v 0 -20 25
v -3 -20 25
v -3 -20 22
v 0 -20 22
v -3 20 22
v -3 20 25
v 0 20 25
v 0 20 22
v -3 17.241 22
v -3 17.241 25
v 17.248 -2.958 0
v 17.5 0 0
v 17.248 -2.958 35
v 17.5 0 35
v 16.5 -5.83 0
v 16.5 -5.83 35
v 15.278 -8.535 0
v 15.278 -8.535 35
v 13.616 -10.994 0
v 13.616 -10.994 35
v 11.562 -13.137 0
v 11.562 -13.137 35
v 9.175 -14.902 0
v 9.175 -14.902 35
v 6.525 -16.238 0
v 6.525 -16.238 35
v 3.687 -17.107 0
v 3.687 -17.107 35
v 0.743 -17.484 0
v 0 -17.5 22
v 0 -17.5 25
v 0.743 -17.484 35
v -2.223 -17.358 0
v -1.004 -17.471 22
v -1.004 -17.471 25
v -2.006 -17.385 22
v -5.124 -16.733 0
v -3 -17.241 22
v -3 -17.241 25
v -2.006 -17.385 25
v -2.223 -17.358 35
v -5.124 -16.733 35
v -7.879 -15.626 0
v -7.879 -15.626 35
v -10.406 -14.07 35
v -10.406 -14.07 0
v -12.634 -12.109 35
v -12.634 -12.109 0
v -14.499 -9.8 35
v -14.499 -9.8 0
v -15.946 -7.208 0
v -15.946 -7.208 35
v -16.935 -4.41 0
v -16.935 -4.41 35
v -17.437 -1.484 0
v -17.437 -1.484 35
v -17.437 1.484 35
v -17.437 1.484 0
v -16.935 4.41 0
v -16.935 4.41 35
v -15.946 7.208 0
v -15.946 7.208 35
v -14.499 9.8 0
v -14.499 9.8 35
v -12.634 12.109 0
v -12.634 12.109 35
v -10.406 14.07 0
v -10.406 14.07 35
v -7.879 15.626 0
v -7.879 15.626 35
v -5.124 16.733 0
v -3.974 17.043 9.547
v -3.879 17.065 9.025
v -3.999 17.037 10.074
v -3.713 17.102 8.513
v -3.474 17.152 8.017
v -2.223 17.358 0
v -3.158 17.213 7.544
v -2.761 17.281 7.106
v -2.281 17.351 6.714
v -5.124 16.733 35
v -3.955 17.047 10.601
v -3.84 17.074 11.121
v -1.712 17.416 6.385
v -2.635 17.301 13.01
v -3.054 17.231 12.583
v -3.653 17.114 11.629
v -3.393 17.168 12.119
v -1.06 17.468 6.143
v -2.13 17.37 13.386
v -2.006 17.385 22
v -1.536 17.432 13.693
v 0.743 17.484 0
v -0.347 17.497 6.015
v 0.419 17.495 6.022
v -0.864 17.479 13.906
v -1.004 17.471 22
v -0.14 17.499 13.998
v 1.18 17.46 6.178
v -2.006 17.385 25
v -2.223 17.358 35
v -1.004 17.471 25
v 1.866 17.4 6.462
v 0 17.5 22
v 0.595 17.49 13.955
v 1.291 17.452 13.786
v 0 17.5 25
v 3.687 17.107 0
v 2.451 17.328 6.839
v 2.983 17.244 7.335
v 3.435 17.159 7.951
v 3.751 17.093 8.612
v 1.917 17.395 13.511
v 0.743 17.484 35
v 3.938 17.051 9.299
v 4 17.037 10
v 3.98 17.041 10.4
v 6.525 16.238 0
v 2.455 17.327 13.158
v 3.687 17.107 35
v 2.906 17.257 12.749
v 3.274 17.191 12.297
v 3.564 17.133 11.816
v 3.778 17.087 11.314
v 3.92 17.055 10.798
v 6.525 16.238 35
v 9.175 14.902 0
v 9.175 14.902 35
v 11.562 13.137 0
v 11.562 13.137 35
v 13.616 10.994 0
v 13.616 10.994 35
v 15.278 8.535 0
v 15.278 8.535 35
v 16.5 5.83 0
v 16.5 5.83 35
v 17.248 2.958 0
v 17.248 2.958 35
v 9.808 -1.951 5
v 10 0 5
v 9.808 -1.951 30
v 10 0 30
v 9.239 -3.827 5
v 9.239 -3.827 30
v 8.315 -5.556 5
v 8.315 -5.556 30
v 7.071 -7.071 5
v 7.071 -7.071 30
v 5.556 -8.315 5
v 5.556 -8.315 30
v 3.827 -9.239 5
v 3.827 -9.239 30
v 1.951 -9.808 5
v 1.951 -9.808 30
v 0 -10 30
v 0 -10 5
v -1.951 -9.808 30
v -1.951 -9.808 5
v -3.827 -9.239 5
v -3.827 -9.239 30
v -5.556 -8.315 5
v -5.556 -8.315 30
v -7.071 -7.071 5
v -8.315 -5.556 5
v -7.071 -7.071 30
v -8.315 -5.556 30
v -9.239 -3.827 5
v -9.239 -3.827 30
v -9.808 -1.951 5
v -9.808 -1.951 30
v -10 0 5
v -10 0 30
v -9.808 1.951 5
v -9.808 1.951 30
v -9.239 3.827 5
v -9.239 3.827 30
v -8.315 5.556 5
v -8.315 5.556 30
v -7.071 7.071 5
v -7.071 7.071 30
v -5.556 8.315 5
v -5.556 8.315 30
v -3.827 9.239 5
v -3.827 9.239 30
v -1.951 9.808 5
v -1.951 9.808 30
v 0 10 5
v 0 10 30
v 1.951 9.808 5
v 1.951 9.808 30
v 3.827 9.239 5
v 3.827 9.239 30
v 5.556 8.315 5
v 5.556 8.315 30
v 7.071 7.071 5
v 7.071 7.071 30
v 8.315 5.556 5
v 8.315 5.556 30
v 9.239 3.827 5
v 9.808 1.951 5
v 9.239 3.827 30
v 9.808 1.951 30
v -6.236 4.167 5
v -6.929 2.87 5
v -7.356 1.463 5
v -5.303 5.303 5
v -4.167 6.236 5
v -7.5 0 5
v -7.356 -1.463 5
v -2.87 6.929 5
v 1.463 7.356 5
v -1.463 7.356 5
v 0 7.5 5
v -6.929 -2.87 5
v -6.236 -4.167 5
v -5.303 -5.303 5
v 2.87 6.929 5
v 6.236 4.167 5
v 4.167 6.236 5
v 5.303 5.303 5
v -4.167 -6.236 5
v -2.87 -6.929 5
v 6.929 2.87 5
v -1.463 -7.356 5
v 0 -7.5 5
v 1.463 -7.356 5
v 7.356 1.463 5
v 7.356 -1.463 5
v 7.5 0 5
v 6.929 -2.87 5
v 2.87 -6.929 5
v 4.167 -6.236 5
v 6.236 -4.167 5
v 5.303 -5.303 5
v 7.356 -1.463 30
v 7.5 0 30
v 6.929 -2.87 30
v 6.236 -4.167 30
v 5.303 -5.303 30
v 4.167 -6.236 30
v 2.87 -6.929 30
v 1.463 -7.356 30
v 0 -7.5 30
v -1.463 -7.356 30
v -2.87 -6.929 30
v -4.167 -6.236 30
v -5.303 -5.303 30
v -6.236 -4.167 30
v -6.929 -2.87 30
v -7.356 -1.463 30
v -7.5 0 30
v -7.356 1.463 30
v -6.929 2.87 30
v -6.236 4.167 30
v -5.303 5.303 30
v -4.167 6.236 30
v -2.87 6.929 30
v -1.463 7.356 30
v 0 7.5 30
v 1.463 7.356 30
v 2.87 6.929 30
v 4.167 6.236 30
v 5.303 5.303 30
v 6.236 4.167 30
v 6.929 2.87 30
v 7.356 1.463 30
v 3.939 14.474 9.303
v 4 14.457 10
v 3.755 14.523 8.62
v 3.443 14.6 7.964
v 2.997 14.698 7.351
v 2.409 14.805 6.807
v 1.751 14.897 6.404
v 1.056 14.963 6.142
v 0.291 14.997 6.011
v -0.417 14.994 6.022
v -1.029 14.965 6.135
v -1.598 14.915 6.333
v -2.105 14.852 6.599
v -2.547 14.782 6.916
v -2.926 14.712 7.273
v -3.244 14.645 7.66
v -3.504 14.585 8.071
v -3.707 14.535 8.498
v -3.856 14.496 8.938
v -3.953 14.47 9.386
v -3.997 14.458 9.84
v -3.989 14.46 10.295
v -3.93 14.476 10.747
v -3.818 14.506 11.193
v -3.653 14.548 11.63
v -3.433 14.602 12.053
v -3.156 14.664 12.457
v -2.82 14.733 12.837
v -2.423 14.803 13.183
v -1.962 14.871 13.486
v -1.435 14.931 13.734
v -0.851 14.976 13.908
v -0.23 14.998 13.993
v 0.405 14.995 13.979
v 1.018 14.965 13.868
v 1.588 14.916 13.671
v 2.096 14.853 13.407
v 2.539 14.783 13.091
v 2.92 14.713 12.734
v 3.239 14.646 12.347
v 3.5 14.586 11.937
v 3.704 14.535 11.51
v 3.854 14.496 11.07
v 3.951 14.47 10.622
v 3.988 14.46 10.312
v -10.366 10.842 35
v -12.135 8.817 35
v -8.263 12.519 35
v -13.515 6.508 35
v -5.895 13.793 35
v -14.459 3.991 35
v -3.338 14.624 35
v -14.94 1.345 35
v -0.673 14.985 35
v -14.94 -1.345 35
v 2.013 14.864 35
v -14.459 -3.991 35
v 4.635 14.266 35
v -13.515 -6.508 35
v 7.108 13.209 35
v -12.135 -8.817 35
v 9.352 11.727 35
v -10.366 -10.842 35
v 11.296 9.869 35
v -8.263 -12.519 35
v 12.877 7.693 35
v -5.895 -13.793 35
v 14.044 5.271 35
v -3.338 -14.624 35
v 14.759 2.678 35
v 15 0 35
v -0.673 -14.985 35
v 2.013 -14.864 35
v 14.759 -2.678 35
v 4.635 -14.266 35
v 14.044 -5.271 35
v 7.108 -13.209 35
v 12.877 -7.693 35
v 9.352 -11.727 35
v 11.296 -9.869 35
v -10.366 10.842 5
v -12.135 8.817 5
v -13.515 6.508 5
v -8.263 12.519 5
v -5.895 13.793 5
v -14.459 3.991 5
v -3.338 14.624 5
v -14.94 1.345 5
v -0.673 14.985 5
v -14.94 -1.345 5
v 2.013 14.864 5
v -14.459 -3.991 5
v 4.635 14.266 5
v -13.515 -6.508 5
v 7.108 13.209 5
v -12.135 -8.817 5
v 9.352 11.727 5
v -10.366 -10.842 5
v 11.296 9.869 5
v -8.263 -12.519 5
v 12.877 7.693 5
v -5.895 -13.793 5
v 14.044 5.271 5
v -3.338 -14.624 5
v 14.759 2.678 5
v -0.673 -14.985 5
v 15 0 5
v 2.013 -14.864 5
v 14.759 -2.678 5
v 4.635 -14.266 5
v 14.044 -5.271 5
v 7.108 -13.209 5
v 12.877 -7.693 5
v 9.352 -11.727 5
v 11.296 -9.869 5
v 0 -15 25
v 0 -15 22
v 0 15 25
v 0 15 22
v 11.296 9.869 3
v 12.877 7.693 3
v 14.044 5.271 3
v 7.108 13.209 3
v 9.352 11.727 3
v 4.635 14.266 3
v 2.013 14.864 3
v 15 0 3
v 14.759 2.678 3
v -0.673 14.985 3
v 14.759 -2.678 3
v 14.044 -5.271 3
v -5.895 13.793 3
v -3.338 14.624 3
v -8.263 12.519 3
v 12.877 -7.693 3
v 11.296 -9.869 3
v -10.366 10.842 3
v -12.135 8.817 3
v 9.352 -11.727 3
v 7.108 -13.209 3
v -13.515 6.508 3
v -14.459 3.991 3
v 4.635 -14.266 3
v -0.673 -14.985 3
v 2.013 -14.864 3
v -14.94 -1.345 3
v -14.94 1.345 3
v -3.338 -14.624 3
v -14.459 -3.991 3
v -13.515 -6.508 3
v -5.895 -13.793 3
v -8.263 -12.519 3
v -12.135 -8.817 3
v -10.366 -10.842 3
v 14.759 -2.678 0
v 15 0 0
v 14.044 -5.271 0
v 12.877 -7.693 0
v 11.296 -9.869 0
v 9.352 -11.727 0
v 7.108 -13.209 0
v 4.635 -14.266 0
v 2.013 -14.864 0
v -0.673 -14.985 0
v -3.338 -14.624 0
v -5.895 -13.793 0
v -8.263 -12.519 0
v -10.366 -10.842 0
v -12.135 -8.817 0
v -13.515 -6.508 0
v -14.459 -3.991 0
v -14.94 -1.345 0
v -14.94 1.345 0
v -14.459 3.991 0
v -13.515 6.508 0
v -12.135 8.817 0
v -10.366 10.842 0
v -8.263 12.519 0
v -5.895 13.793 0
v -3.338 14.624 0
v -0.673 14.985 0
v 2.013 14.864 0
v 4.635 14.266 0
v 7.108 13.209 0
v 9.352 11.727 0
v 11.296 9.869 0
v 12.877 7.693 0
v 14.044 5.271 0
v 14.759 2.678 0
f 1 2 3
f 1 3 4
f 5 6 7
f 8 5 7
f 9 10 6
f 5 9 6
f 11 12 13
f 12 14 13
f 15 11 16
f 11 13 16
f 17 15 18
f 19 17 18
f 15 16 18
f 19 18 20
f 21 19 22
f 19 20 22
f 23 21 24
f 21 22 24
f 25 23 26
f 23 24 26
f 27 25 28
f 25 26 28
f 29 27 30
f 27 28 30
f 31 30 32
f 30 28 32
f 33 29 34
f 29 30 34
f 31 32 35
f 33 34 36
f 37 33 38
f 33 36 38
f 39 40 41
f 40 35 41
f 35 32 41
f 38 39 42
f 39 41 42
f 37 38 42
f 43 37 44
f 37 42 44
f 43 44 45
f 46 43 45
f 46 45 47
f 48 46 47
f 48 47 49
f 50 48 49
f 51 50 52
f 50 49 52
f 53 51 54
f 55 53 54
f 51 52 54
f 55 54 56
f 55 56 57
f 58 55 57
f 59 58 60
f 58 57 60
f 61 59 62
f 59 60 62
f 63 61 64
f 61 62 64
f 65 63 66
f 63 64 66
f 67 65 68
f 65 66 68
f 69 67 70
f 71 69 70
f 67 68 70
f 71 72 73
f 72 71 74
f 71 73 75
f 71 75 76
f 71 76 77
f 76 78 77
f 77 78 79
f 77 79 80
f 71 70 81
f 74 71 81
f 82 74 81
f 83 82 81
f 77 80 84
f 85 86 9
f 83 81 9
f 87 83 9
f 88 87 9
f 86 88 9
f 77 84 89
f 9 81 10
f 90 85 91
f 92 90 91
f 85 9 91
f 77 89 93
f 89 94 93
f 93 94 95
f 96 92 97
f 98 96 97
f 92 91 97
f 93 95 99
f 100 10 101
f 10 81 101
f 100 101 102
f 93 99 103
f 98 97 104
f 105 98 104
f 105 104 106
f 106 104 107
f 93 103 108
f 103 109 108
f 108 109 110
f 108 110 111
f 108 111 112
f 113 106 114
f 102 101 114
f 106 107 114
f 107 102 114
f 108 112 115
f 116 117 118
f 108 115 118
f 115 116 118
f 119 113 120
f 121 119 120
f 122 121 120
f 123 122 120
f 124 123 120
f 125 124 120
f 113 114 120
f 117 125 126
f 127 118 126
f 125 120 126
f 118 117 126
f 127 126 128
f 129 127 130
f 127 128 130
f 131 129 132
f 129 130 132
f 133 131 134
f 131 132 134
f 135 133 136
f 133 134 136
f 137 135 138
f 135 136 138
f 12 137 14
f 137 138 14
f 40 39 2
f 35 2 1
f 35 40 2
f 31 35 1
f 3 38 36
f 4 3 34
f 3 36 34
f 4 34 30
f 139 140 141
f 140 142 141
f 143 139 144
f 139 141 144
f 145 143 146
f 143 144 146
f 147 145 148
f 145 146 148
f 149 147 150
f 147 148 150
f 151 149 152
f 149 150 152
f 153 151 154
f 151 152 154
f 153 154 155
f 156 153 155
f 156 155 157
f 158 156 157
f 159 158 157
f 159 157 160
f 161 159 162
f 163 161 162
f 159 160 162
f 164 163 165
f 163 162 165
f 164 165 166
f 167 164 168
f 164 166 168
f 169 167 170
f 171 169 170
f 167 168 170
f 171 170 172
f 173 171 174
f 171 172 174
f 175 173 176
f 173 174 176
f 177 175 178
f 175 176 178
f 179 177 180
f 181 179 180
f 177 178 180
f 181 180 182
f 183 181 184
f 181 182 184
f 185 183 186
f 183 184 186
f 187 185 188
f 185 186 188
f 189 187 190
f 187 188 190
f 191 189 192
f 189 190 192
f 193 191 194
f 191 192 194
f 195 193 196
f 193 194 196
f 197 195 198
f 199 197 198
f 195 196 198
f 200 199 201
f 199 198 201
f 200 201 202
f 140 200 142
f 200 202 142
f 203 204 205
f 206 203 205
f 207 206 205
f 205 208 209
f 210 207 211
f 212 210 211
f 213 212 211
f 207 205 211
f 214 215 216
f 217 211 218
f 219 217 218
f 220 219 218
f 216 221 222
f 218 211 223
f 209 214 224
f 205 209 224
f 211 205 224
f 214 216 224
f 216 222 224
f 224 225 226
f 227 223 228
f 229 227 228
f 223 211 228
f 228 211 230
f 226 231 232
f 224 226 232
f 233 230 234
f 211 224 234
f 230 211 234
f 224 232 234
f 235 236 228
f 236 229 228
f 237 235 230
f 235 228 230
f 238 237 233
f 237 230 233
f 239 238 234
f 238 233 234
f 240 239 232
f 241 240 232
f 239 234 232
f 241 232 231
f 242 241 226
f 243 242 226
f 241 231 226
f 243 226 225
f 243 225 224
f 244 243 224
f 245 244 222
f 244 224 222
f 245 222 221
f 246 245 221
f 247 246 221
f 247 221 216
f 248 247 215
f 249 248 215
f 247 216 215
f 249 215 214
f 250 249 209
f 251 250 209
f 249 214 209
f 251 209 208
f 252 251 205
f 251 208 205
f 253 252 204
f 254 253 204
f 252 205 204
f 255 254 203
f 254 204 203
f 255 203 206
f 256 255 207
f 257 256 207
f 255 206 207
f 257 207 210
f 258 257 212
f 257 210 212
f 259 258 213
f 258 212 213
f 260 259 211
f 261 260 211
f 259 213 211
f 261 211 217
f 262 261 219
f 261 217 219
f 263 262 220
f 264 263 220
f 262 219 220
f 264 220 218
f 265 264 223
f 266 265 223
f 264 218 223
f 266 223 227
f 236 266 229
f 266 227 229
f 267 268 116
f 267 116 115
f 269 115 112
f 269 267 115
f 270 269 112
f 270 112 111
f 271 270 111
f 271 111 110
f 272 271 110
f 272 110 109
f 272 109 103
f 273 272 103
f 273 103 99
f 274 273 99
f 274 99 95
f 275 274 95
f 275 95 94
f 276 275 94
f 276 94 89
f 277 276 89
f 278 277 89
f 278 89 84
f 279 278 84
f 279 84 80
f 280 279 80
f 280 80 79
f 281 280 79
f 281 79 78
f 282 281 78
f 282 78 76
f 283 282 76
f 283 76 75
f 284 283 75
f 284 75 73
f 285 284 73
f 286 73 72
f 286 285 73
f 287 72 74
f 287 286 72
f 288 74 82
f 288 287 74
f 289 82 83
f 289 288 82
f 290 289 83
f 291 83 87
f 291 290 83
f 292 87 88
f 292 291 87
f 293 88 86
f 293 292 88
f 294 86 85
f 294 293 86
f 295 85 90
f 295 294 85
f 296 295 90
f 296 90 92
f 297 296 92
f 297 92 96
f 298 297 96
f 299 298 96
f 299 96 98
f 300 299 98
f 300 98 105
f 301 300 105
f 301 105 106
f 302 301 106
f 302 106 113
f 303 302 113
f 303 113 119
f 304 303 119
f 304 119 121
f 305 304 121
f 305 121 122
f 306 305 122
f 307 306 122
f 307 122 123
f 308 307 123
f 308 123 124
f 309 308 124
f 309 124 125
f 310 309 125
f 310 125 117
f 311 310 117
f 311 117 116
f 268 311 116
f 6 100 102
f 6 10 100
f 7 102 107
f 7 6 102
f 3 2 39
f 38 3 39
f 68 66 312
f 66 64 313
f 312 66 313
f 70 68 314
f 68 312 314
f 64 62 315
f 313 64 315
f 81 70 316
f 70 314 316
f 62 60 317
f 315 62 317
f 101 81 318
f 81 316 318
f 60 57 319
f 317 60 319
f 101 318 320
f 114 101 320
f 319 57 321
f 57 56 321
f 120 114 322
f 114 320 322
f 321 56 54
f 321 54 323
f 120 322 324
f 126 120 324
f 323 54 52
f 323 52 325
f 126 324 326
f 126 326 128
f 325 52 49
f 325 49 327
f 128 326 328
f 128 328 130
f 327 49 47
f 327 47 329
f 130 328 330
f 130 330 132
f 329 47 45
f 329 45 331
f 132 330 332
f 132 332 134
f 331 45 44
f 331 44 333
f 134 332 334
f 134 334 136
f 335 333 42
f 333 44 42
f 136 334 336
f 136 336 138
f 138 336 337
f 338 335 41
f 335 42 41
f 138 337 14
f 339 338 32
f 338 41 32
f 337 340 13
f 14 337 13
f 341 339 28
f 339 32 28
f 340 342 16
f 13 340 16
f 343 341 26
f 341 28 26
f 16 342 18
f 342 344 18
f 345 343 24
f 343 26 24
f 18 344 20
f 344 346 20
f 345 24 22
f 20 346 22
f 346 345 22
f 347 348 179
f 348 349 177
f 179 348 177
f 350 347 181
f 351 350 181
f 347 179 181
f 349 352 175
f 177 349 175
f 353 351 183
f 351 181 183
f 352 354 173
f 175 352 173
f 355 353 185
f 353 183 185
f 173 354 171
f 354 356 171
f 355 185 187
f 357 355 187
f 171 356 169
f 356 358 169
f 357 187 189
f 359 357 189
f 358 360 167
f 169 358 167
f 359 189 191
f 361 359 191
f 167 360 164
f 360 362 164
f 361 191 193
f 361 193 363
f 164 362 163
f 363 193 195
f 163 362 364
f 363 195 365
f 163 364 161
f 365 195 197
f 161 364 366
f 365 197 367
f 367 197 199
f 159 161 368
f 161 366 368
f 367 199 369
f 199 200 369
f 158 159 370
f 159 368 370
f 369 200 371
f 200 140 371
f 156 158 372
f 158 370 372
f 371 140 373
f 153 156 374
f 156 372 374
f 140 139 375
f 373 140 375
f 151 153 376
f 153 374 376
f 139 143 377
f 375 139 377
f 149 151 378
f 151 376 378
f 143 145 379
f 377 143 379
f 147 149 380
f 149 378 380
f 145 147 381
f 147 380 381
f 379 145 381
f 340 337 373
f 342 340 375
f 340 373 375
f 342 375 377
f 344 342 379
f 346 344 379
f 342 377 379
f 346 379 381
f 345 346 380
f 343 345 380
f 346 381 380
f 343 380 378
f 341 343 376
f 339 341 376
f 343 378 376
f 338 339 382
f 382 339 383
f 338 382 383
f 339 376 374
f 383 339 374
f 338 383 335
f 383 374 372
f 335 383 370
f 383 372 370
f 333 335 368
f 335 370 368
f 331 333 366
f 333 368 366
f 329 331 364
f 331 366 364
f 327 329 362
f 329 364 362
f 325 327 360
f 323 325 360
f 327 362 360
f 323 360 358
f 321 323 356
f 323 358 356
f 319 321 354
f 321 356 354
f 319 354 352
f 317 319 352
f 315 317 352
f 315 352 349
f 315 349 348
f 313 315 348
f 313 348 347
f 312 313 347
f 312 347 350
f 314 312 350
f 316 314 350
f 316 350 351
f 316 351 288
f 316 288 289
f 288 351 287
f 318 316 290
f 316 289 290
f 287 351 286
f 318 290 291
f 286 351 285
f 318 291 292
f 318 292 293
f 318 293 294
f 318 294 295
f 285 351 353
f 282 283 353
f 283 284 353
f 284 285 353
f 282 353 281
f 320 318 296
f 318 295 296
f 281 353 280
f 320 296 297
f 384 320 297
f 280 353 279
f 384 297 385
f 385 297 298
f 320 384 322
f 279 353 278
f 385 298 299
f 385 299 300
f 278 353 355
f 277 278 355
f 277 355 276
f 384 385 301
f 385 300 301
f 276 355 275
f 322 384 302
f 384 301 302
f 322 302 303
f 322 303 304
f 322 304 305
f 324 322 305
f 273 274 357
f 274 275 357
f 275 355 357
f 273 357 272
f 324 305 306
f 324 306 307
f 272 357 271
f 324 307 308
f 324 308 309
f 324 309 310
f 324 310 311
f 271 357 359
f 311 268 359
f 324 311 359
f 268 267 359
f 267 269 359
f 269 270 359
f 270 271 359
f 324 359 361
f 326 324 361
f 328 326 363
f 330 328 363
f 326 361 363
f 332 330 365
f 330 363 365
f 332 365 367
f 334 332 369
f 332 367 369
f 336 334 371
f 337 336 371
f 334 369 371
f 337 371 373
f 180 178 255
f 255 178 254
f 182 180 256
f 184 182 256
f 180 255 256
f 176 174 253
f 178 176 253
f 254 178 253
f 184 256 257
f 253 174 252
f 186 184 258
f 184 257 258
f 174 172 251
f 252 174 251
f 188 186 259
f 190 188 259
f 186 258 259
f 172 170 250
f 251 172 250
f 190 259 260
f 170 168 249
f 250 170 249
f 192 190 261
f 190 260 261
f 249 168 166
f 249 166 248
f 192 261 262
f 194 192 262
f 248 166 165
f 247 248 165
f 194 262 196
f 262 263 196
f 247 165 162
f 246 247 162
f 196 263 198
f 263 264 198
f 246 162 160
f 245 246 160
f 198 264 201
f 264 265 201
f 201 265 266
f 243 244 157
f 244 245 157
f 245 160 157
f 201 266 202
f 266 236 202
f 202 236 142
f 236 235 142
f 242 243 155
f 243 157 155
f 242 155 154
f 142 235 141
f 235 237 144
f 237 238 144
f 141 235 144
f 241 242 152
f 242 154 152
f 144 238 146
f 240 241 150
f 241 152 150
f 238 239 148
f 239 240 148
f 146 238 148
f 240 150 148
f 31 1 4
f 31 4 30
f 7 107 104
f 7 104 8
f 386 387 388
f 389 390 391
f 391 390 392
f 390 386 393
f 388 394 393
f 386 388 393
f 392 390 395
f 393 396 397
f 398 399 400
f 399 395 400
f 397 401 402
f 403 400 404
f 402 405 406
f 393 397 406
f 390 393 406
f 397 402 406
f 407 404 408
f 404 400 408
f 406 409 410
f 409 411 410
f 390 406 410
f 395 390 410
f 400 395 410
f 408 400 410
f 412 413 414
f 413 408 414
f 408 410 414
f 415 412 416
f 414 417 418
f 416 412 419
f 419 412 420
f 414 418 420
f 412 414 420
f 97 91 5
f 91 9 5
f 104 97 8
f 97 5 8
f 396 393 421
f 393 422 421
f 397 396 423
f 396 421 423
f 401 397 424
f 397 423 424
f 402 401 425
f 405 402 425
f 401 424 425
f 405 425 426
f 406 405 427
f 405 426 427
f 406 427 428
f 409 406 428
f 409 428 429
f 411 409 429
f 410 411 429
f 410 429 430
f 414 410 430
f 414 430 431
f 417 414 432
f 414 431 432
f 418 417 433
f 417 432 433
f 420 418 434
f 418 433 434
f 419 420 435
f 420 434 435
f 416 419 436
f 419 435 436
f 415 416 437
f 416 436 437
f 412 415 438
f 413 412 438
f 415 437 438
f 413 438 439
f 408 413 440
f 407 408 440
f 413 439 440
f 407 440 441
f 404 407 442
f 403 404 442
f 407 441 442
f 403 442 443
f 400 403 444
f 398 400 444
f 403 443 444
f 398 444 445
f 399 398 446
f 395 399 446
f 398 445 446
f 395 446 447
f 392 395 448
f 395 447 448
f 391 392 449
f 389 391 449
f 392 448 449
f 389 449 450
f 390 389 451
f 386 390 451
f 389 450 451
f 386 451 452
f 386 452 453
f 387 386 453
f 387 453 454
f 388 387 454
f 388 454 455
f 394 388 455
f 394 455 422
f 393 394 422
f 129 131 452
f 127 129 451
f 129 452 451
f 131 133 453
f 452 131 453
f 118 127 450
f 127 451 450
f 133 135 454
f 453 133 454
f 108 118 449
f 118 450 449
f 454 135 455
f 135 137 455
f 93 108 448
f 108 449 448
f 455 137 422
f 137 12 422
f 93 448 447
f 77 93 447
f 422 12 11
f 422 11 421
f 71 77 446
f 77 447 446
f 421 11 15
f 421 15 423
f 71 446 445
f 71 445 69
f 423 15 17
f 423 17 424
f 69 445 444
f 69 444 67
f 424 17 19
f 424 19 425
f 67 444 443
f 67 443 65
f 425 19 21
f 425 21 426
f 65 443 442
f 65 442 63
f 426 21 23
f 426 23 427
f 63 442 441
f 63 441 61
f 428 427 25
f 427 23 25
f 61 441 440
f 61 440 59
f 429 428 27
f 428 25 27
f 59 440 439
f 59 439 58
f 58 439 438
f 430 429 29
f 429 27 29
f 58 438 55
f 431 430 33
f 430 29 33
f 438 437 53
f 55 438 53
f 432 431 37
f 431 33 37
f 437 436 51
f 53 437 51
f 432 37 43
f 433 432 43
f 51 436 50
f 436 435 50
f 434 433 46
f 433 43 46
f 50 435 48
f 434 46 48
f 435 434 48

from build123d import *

# Parameters (mm, degrees)
SKETCH3_W           = 3
SKETCH3_H           = 5
BOSS_EXTRUDE1_DEPTH = 3
SKETCH5_R           = 4
CUT_EXTRUDE1_DEPTH  = 5


with BuildPart() as part:
    # Sketch1 → Revolve1 (revolve)
    with BuildSketch(Plane.XZ):
        Polygon((7.5, 5), (0, 5), (0, 3), (15, 3), (15, 0), (17.5, 0), (17.5, 35), (15, 35), (15, 5), (10, 5), (10, 30), (7.5, 30), align=None)
    revolve(axis=Axis((0, 0, 35), (0, 0, -1)))

    # Sketch3 → Boss-Extrude1 (add)
    with BuildSketch(Plane.XY.offset(25)):
        with Locations((-1.5, 17.5)):
            Rectangle(SKETCH3_W, SKETCH3_H)
        with Locations((-1.5, -17.5)):
            Rectangle(SKETCH3_W, SKETCH3_H)
    extrude(amount=-BOSS_EXTRUDE1_DEPTH)

    # Sketch5 → Cut-Extrude1 (cut)
    with BuildSketch(Plane(origin=(0, 13, 0), x_dir=(1, 0, 0), z_dir=(0, 1, 0))):
        with Locations((0, -10)):
            Circle(SKETCH5_R)
    extrude(amount=CUT_EXTRUDE1_DEPTH, mode=Mode.SUBTRACT)


solid = part.part
